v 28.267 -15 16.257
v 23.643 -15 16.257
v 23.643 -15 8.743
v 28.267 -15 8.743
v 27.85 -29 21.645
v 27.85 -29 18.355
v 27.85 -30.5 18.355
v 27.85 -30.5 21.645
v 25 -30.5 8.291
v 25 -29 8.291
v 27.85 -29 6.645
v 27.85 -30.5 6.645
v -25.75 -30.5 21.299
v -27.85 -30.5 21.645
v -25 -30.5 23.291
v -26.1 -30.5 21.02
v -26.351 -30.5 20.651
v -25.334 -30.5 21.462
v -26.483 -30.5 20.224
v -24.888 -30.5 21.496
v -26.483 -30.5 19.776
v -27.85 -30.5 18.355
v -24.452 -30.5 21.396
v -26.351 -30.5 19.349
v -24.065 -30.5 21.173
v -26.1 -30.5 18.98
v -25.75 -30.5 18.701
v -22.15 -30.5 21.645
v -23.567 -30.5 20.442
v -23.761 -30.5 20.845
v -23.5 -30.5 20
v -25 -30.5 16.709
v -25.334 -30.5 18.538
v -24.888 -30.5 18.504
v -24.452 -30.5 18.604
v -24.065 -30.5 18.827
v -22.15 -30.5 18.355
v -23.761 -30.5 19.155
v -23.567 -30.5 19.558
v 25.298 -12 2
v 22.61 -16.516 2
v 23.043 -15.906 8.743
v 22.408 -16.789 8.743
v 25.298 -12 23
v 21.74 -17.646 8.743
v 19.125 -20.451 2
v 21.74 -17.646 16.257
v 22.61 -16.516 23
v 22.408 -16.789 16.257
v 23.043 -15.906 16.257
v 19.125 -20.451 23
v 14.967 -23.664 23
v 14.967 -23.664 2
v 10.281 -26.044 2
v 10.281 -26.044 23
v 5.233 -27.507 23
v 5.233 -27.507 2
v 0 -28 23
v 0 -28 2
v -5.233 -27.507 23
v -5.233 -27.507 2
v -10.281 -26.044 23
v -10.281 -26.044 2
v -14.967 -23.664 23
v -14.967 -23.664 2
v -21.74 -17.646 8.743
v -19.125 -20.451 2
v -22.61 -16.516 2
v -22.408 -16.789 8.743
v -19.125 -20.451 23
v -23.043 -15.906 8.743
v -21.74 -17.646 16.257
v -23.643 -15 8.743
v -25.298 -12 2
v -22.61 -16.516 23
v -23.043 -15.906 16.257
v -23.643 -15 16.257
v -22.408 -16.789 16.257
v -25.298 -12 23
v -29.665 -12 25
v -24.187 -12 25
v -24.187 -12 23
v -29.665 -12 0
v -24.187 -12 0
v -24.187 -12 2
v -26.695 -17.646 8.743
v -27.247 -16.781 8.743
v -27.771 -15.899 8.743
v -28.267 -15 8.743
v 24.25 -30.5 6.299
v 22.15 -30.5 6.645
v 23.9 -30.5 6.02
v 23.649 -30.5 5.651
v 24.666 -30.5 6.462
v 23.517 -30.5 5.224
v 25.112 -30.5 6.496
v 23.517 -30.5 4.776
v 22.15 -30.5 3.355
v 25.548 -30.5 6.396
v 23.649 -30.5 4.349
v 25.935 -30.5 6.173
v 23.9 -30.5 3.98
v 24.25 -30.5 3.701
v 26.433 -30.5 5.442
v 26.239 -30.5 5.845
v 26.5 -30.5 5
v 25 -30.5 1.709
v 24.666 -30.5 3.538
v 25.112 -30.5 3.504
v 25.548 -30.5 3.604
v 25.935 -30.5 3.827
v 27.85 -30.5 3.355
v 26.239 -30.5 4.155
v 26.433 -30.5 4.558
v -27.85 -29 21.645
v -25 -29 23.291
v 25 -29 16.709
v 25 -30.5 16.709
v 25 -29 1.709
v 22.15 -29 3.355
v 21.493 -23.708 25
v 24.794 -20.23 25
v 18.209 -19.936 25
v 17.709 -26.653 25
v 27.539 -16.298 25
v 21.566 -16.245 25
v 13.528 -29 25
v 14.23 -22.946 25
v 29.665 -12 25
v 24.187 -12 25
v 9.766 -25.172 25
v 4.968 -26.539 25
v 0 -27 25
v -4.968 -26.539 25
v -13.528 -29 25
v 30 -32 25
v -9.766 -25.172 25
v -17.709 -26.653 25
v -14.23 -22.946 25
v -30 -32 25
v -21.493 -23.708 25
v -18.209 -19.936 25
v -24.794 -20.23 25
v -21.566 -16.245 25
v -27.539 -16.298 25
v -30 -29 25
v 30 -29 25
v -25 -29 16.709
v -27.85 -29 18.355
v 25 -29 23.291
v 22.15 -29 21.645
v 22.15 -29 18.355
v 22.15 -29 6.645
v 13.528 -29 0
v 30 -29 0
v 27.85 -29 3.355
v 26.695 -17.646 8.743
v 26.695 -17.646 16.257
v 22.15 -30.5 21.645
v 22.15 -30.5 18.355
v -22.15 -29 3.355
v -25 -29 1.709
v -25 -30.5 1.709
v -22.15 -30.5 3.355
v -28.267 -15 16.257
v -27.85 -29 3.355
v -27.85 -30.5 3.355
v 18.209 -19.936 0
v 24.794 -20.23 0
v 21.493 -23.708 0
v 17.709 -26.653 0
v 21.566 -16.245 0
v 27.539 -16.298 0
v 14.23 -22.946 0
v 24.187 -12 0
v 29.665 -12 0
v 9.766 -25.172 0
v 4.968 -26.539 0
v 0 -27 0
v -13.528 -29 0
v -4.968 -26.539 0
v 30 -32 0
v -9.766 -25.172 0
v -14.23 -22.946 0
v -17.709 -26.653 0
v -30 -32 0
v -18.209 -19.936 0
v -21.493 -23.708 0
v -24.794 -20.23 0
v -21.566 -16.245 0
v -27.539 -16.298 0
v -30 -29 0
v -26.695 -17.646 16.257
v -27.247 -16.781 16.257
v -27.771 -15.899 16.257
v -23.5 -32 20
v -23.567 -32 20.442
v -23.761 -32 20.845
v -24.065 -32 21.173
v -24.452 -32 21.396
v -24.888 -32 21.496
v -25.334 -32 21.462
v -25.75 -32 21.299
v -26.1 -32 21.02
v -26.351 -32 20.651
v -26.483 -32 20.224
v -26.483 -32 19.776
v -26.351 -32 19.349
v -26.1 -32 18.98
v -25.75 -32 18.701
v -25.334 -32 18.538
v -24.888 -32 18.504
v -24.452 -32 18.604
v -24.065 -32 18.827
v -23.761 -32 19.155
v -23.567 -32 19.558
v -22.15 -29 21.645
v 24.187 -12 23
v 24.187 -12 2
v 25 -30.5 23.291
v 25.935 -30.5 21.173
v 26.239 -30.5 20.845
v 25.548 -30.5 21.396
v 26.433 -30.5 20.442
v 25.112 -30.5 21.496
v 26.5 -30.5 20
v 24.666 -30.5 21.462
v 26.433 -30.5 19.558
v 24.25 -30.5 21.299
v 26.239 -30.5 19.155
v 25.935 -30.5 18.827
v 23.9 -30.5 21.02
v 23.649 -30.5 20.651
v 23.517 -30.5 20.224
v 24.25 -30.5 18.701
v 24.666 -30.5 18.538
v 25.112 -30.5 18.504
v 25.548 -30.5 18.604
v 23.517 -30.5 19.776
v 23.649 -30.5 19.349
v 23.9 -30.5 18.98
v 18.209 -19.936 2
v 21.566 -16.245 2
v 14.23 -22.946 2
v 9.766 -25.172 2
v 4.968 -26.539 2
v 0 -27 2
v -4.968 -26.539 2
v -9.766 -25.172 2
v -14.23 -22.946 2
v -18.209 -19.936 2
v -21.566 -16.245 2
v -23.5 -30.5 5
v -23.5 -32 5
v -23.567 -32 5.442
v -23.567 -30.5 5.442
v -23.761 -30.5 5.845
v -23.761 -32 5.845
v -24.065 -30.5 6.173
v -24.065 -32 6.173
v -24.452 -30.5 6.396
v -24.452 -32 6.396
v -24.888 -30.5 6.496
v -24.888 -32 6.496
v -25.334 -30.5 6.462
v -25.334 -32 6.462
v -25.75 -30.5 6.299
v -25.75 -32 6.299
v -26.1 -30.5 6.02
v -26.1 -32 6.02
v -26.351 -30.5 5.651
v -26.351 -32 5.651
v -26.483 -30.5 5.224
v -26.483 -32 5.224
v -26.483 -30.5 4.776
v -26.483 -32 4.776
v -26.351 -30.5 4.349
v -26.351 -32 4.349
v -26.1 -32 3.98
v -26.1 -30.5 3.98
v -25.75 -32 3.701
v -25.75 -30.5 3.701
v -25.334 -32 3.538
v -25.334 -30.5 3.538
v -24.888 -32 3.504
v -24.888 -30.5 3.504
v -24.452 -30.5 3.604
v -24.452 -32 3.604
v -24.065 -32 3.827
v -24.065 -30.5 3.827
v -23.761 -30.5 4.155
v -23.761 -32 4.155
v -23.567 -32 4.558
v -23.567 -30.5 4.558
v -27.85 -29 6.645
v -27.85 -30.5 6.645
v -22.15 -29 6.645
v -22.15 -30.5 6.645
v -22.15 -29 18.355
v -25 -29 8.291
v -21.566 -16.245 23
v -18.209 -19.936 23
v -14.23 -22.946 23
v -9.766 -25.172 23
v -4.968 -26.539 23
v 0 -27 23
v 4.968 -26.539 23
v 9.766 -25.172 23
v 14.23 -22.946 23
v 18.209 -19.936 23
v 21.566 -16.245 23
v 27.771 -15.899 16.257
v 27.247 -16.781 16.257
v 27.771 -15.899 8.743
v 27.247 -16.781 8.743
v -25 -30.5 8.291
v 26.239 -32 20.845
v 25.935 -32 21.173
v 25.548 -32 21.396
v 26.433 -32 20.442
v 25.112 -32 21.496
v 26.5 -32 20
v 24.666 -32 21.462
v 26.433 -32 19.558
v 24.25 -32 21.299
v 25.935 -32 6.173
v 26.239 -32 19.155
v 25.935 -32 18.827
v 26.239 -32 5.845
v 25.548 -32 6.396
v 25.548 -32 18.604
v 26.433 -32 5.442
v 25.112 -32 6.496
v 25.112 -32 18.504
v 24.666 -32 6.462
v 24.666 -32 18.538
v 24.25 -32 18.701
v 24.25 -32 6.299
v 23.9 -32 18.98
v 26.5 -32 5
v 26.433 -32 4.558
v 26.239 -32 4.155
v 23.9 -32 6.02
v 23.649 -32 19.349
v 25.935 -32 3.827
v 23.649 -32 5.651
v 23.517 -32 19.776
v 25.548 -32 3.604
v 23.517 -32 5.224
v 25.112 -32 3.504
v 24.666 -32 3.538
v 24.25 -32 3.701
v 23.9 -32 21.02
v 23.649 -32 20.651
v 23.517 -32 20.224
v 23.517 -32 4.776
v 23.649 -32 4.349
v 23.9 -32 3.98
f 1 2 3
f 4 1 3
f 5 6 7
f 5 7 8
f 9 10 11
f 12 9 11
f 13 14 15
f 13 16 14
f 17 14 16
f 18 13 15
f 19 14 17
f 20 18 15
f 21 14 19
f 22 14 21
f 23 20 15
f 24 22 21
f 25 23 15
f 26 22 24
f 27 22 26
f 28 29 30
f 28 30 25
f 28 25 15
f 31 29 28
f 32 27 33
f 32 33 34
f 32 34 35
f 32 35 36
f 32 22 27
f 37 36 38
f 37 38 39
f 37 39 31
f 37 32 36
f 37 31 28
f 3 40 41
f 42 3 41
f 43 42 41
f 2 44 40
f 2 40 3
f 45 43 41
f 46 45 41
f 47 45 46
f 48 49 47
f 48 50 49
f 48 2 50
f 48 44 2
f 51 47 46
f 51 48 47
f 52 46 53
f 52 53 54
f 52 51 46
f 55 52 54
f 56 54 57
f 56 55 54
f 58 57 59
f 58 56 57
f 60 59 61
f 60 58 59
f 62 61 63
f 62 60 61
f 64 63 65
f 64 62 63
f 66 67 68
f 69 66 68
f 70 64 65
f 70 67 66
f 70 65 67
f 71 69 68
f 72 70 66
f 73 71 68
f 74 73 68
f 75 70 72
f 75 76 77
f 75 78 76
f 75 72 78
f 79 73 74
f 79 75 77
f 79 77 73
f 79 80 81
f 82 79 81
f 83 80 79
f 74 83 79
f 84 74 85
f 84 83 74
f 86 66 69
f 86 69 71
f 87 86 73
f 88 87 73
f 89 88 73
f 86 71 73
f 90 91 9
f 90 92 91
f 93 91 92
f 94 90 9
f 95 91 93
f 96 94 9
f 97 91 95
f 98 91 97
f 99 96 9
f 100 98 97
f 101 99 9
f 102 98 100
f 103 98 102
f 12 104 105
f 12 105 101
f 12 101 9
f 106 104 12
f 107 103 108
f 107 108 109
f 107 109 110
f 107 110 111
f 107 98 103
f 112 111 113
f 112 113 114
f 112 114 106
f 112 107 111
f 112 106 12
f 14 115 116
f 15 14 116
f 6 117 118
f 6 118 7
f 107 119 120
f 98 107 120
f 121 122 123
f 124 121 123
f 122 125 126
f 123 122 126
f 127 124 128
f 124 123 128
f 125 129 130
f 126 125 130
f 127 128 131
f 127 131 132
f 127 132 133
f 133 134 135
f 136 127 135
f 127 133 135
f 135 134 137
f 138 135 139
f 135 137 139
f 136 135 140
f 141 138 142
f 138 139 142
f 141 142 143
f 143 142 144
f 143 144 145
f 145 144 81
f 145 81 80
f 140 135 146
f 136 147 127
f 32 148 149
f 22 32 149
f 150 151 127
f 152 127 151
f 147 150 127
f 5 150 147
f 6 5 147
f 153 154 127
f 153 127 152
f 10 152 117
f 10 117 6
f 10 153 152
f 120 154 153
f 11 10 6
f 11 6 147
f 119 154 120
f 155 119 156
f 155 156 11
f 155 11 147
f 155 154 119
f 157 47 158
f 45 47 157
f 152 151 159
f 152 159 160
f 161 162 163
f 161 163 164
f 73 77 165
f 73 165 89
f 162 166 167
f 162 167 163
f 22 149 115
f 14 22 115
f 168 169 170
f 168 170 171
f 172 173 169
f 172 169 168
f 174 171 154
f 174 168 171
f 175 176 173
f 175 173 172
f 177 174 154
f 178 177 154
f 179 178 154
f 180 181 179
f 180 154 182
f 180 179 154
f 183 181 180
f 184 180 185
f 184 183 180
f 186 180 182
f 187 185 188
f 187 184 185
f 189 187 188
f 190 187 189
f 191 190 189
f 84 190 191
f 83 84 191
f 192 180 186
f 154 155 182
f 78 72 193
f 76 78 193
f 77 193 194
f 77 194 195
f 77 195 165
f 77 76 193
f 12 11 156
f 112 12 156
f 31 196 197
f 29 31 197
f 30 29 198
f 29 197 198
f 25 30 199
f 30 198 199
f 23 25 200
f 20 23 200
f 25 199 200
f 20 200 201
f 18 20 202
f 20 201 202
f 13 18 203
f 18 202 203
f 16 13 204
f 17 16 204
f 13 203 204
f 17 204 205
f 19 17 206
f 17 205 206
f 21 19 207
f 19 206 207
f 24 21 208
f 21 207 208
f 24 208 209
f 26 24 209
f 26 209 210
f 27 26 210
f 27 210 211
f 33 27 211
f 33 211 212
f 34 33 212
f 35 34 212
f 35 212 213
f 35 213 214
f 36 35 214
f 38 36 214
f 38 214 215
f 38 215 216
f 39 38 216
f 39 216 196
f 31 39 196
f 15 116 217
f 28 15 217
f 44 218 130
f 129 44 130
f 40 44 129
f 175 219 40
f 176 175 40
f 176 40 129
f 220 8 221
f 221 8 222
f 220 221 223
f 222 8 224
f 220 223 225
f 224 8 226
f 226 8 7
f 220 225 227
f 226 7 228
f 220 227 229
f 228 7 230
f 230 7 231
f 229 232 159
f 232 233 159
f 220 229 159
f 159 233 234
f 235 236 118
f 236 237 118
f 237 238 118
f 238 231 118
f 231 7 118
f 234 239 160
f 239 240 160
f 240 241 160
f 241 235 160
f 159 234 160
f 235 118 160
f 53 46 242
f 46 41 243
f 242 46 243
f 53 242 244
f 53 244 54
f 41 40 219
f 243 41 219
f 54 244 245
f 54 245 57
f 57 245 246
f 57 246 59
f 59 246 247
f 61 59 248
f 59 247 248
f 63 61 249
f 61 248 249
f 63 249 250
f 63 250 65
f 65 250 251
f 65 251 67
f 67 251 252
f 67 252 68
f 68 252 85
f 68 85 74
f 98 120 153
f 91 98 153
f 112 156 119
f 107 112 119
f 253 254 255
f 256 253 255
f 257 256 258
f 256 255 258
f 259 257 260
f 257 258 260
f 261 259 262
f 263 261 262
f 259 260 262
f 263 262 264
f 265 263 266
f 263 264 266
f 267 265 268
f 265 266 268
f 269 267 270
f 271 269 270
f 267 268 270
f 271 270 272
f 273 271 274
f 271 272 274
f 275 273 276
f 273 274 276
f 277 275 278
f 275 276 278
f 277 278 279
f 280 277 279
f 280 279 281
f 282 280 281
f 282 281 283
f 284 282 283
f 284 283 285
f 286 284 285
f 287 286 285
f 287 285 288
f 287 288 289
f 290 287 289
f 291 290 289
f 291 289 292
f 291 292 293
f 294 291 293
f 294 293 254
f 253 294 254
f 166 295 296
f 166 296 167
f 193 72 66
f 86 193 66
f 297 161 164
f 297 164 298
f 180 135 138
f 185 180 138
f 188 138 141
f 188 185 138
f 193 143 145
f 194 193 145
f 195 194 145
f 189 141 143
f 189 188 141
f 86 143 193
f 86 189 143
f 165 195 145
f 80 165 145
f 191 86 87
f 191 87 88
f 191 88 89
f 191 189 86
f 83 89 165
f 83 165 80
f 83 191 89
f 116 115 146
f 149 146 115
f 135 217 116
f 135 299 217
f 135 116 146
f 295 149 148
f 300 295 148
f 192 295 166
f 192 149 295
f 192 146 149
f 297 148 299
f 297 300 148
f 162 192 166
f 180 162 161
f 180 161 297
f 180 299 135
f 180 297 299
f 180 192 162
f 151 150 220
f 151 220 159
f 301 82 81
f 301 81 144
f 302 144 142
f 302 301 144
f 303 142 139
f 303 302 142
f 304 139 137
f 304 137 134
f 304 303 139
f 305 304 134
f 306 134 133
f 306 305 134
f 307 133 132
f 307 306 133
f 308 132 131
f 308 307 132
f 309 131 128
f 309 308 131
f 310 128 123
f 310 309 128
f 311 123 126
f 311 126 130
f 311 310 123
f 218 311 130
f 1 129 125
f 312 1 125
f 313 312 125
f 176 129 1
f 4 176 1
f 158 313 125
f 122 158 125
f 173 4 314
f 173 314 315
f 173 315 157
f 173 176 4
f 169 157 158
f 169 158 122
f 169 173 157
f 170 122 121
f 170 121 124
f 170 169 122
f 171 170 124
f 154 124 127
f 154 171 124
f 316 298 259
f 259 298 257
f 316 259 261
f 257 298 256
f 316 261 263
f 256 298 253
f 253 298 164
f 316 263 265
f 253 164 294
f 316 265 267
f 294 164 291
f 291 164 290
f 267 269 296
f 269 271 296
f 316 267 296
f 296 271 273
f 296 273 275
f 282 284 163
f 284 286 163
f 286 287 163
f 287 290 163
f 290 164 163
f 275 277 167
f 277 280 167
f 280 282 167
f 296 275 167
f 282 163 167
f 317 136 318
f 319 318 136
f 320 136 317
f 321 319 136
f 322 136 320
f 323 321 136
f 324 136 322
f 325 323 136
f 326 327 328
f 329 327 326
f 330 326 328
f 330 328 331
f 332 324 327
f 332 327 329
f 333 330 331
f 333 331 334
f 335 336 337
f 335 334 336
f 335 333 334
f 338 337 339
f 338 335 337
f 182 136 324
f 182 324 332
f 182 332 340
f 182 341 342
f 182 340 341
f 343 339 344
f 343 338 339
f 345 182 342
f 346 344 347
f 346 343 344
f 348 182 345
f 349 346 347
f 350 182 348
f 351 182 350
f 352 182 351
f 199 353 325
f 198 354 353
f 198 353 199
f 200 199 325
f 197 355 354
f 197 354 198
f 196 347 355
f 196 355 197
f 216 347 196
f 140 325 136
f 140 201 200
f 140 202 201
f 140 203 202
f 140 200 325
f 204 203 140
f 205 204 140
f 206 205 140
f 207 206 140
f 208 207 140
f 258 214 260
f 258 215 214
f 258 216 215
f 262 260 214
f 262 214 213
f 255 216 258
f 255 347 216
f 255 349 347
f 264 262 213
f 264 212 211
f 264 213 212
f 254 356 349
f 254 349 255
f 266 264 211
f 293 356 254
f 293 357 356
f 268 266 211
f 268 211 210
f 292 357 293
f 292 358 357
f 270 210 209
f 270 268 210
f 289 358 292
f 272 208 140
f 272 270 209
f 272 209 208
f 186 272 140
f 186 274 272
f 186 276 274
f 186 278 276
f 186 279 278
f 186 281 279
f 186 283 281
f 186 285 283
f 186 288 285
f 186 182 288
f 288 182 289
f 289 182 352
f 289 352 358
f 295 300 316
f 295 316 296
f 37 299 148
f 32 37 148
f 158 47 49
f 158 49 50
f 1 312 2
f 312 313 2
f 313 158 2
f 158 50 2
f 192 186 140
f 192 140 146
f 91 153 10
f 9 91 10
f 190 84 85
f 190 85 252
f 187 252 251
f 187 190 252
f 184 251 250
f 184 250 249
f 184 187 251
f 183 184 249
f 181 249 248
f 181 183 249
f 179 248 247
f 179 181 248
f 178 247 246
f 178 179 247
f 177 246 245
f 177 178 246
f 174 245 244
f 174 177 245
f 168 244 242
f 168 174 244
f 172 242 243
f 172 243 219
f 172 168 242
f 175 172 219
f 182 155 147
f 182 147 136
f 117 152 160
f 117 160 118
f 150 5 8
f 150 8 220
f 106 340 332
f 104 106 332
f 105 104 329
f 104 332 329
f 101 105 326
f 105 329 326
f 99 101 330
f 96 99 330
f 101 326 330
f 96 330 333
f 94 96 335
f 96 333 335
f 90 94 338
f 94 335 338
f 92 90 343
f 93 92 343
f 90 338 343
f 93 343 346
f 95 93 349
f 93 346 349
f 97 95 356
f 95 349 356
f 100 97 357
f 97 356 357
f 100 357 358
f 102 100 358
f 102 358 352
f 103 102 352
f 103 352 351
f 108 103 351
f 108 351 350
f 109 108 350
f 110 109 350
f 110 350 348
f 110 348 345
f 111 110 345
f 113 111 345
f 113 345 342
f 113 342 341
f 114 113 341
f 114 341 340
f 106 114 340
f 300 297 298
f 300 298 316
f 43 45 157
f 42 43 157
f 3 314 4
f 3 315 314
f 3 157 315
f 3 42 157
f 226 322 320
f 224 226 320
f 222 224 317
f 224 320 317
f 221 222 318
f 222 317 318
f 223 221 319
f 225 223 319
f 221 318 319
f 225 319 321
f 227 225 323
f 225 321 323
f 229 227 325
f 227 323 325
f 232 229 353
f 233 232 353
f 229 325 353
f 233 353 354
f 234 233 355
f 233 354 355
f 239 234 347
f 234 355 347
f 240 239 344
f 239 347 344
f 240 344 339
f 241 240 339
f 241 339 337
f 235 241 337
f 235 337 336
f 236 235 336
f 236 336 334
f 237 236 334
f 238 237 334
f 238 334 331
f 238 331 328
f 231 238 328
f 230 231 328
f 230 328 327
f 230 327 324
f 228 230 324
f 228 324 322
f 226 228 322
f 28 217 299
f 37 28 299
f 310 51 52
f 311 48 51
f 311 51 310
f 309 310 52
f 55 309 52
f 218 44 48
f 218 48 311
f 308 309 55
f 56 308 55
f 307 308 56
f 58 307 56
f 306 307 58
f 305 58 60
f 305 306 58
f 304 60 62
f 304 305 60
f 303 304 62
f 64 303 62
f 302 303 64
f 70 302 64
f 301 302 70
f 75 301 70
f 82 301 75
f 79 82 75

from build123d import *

# Parameters (mm, degrees)
EXTRUDE_1_DEPTH          = 25
SKETCH_2_W               = 7.514045852
SKETCH_2_H               = 2.645790793
CUT_EXTRUDE_1_DEPTH      = 109
CUT_EXTRUDE_1_DEPTH_BACK = 54
SKETCH_3_R               = 1.5
CUT_EXTRUDE_2_DEPTH      = 7
CUT_EXTRUDE_START        = -2
CUT_EXTRUDE_3_DEPTH      = 21
CUT_EXTRUDE_4_DEPTH      = 1.5


with BuildPart() as part:
    # 草图1 → 凸台-拉伸1 (new body)
    with BuildSketch(Plane.XY):
        with BuildLine():
            Line((30, -32), (-30, -32))
            Line((-30, -32), (-30, -29))
            Line((-30, -29), (-13.527749258, -29))
            ThreePointArc((-13.527749258, -29), (-23.208811843, -22.030684348), (-29.664793948, -12))
            Line((-29.664793948, -12), (-24.186773245, -12))
            ThreePointArc((-24.186773245, -12), (0, -27), (24.186773245, -12))
            Line((24.186773245, -12), (29.664793948, -12))
            ThreePointArc((29.664793948, -12), (23.208811843, -22.030684348), (13.527749258, -29))
            Line((13.527749258, -29), (30, -29))
            Line((30, -29), (30, -32))
        make_face()
    extrude(amount=EXTRUDE_1_DEPTH)

    # 草图2 → 切除-拉伸1 (cut, two sides)
    with BuildSketch(Plane(origin=(0, 0, 0), x_dir=(0, 0, -1), z_dir=(1, 0, 0))) as cut_extrude_1_sk:
        with Locations((-12.5, -16.322895397)):
            Rectangle(SKETCH_2_W, SKETCH_2_H)
    extrude(amount=CUT_EXTRUDE_1_DEPTH, mode=Mode.SUBTRACT)
    extrude(cut_extrude_1_sk.sketch, amount=-CUT_EXTRUDE_1_DEPTH_BACK, mode=Mode.SUBTRACT)

    # 草图3 → 切除-拉伸2 (cut)
    with BuildSketch(Plane.XZ.offset(32)):
        with Locations((-25, 20)):
            Circle(SKETCH_3_R)
        with Locations((25, 20)):
            Circle(SKETCH_3_R)
        with Locations((25, 5)):
            Circle(SKETCH_3_R)
        with Locations((-25, 5)):
            Circle(SKETCH_3_R)
    extrude(amount=-CUT_EXTRUDE_2_DEPTH, mode=Mode.SUBTRACT)

    # 草图4 → 切除-拉伸3 (cut)
    with BuildSketch(Plane.XY.offset(25).offset(CUT_EXTRUDE_START)):
        with BuildLine():
            Line((24.186773245, -12), (25.298221281, -12))
            ThreePointArc((25.298221281, -12), (0, -28), (-25.298221281, -12))
            Line((-25.298221281, -12), (-24.186773245, -12))
            ThreePointArc((-24.186773245, -12), (0, -27), (24.186773245, -12))
        make_face()
    extrude(amount=-CUT_EXTRUDE_3_DEPTH, mode=Mode.SUBTRACT)

    # 草图5 → 切除-拉伸4 (cut)
    with BuildSketch(Plane(origin=(0, -29, 0), x_dir=(1, 0, 0), z_dir=(0, 1, 0))):
        Polygon((-25, -23.290896534), (-22.15, -21.645448267), (-22.15, -18.354551733), (-25, -16.709103466), (-27.85, -18.354551733), (-27.85, -21.645448267), align=None)
        Polygon((27.85, -21.645448267), (25, -23.290896534), (22.15, -21.645448267), (22.15, -18.354551733), (25, -16.709103466), (27.85, -18.354551733), align=None)
        Polygon((25, -1.709103466), (22.15, -3.354551733), (22.15, -6.645448267), (25, -8.290896534), (27.85, -6.645448267), (27.85, -3.354551733), align=None)
        Polygon((-27.85, -3.354551733), (-25, -1.709103466), (-22.15, -3.354551733), (-22.15, -6.645448267), (-25, -8.290896534), (-27.85, -6.645448267), align=None)
    extrude(amount=-CUT_EXTRUDE_4_DEPTH, mode=Mode.SUBTRACT)


solid = part.part
